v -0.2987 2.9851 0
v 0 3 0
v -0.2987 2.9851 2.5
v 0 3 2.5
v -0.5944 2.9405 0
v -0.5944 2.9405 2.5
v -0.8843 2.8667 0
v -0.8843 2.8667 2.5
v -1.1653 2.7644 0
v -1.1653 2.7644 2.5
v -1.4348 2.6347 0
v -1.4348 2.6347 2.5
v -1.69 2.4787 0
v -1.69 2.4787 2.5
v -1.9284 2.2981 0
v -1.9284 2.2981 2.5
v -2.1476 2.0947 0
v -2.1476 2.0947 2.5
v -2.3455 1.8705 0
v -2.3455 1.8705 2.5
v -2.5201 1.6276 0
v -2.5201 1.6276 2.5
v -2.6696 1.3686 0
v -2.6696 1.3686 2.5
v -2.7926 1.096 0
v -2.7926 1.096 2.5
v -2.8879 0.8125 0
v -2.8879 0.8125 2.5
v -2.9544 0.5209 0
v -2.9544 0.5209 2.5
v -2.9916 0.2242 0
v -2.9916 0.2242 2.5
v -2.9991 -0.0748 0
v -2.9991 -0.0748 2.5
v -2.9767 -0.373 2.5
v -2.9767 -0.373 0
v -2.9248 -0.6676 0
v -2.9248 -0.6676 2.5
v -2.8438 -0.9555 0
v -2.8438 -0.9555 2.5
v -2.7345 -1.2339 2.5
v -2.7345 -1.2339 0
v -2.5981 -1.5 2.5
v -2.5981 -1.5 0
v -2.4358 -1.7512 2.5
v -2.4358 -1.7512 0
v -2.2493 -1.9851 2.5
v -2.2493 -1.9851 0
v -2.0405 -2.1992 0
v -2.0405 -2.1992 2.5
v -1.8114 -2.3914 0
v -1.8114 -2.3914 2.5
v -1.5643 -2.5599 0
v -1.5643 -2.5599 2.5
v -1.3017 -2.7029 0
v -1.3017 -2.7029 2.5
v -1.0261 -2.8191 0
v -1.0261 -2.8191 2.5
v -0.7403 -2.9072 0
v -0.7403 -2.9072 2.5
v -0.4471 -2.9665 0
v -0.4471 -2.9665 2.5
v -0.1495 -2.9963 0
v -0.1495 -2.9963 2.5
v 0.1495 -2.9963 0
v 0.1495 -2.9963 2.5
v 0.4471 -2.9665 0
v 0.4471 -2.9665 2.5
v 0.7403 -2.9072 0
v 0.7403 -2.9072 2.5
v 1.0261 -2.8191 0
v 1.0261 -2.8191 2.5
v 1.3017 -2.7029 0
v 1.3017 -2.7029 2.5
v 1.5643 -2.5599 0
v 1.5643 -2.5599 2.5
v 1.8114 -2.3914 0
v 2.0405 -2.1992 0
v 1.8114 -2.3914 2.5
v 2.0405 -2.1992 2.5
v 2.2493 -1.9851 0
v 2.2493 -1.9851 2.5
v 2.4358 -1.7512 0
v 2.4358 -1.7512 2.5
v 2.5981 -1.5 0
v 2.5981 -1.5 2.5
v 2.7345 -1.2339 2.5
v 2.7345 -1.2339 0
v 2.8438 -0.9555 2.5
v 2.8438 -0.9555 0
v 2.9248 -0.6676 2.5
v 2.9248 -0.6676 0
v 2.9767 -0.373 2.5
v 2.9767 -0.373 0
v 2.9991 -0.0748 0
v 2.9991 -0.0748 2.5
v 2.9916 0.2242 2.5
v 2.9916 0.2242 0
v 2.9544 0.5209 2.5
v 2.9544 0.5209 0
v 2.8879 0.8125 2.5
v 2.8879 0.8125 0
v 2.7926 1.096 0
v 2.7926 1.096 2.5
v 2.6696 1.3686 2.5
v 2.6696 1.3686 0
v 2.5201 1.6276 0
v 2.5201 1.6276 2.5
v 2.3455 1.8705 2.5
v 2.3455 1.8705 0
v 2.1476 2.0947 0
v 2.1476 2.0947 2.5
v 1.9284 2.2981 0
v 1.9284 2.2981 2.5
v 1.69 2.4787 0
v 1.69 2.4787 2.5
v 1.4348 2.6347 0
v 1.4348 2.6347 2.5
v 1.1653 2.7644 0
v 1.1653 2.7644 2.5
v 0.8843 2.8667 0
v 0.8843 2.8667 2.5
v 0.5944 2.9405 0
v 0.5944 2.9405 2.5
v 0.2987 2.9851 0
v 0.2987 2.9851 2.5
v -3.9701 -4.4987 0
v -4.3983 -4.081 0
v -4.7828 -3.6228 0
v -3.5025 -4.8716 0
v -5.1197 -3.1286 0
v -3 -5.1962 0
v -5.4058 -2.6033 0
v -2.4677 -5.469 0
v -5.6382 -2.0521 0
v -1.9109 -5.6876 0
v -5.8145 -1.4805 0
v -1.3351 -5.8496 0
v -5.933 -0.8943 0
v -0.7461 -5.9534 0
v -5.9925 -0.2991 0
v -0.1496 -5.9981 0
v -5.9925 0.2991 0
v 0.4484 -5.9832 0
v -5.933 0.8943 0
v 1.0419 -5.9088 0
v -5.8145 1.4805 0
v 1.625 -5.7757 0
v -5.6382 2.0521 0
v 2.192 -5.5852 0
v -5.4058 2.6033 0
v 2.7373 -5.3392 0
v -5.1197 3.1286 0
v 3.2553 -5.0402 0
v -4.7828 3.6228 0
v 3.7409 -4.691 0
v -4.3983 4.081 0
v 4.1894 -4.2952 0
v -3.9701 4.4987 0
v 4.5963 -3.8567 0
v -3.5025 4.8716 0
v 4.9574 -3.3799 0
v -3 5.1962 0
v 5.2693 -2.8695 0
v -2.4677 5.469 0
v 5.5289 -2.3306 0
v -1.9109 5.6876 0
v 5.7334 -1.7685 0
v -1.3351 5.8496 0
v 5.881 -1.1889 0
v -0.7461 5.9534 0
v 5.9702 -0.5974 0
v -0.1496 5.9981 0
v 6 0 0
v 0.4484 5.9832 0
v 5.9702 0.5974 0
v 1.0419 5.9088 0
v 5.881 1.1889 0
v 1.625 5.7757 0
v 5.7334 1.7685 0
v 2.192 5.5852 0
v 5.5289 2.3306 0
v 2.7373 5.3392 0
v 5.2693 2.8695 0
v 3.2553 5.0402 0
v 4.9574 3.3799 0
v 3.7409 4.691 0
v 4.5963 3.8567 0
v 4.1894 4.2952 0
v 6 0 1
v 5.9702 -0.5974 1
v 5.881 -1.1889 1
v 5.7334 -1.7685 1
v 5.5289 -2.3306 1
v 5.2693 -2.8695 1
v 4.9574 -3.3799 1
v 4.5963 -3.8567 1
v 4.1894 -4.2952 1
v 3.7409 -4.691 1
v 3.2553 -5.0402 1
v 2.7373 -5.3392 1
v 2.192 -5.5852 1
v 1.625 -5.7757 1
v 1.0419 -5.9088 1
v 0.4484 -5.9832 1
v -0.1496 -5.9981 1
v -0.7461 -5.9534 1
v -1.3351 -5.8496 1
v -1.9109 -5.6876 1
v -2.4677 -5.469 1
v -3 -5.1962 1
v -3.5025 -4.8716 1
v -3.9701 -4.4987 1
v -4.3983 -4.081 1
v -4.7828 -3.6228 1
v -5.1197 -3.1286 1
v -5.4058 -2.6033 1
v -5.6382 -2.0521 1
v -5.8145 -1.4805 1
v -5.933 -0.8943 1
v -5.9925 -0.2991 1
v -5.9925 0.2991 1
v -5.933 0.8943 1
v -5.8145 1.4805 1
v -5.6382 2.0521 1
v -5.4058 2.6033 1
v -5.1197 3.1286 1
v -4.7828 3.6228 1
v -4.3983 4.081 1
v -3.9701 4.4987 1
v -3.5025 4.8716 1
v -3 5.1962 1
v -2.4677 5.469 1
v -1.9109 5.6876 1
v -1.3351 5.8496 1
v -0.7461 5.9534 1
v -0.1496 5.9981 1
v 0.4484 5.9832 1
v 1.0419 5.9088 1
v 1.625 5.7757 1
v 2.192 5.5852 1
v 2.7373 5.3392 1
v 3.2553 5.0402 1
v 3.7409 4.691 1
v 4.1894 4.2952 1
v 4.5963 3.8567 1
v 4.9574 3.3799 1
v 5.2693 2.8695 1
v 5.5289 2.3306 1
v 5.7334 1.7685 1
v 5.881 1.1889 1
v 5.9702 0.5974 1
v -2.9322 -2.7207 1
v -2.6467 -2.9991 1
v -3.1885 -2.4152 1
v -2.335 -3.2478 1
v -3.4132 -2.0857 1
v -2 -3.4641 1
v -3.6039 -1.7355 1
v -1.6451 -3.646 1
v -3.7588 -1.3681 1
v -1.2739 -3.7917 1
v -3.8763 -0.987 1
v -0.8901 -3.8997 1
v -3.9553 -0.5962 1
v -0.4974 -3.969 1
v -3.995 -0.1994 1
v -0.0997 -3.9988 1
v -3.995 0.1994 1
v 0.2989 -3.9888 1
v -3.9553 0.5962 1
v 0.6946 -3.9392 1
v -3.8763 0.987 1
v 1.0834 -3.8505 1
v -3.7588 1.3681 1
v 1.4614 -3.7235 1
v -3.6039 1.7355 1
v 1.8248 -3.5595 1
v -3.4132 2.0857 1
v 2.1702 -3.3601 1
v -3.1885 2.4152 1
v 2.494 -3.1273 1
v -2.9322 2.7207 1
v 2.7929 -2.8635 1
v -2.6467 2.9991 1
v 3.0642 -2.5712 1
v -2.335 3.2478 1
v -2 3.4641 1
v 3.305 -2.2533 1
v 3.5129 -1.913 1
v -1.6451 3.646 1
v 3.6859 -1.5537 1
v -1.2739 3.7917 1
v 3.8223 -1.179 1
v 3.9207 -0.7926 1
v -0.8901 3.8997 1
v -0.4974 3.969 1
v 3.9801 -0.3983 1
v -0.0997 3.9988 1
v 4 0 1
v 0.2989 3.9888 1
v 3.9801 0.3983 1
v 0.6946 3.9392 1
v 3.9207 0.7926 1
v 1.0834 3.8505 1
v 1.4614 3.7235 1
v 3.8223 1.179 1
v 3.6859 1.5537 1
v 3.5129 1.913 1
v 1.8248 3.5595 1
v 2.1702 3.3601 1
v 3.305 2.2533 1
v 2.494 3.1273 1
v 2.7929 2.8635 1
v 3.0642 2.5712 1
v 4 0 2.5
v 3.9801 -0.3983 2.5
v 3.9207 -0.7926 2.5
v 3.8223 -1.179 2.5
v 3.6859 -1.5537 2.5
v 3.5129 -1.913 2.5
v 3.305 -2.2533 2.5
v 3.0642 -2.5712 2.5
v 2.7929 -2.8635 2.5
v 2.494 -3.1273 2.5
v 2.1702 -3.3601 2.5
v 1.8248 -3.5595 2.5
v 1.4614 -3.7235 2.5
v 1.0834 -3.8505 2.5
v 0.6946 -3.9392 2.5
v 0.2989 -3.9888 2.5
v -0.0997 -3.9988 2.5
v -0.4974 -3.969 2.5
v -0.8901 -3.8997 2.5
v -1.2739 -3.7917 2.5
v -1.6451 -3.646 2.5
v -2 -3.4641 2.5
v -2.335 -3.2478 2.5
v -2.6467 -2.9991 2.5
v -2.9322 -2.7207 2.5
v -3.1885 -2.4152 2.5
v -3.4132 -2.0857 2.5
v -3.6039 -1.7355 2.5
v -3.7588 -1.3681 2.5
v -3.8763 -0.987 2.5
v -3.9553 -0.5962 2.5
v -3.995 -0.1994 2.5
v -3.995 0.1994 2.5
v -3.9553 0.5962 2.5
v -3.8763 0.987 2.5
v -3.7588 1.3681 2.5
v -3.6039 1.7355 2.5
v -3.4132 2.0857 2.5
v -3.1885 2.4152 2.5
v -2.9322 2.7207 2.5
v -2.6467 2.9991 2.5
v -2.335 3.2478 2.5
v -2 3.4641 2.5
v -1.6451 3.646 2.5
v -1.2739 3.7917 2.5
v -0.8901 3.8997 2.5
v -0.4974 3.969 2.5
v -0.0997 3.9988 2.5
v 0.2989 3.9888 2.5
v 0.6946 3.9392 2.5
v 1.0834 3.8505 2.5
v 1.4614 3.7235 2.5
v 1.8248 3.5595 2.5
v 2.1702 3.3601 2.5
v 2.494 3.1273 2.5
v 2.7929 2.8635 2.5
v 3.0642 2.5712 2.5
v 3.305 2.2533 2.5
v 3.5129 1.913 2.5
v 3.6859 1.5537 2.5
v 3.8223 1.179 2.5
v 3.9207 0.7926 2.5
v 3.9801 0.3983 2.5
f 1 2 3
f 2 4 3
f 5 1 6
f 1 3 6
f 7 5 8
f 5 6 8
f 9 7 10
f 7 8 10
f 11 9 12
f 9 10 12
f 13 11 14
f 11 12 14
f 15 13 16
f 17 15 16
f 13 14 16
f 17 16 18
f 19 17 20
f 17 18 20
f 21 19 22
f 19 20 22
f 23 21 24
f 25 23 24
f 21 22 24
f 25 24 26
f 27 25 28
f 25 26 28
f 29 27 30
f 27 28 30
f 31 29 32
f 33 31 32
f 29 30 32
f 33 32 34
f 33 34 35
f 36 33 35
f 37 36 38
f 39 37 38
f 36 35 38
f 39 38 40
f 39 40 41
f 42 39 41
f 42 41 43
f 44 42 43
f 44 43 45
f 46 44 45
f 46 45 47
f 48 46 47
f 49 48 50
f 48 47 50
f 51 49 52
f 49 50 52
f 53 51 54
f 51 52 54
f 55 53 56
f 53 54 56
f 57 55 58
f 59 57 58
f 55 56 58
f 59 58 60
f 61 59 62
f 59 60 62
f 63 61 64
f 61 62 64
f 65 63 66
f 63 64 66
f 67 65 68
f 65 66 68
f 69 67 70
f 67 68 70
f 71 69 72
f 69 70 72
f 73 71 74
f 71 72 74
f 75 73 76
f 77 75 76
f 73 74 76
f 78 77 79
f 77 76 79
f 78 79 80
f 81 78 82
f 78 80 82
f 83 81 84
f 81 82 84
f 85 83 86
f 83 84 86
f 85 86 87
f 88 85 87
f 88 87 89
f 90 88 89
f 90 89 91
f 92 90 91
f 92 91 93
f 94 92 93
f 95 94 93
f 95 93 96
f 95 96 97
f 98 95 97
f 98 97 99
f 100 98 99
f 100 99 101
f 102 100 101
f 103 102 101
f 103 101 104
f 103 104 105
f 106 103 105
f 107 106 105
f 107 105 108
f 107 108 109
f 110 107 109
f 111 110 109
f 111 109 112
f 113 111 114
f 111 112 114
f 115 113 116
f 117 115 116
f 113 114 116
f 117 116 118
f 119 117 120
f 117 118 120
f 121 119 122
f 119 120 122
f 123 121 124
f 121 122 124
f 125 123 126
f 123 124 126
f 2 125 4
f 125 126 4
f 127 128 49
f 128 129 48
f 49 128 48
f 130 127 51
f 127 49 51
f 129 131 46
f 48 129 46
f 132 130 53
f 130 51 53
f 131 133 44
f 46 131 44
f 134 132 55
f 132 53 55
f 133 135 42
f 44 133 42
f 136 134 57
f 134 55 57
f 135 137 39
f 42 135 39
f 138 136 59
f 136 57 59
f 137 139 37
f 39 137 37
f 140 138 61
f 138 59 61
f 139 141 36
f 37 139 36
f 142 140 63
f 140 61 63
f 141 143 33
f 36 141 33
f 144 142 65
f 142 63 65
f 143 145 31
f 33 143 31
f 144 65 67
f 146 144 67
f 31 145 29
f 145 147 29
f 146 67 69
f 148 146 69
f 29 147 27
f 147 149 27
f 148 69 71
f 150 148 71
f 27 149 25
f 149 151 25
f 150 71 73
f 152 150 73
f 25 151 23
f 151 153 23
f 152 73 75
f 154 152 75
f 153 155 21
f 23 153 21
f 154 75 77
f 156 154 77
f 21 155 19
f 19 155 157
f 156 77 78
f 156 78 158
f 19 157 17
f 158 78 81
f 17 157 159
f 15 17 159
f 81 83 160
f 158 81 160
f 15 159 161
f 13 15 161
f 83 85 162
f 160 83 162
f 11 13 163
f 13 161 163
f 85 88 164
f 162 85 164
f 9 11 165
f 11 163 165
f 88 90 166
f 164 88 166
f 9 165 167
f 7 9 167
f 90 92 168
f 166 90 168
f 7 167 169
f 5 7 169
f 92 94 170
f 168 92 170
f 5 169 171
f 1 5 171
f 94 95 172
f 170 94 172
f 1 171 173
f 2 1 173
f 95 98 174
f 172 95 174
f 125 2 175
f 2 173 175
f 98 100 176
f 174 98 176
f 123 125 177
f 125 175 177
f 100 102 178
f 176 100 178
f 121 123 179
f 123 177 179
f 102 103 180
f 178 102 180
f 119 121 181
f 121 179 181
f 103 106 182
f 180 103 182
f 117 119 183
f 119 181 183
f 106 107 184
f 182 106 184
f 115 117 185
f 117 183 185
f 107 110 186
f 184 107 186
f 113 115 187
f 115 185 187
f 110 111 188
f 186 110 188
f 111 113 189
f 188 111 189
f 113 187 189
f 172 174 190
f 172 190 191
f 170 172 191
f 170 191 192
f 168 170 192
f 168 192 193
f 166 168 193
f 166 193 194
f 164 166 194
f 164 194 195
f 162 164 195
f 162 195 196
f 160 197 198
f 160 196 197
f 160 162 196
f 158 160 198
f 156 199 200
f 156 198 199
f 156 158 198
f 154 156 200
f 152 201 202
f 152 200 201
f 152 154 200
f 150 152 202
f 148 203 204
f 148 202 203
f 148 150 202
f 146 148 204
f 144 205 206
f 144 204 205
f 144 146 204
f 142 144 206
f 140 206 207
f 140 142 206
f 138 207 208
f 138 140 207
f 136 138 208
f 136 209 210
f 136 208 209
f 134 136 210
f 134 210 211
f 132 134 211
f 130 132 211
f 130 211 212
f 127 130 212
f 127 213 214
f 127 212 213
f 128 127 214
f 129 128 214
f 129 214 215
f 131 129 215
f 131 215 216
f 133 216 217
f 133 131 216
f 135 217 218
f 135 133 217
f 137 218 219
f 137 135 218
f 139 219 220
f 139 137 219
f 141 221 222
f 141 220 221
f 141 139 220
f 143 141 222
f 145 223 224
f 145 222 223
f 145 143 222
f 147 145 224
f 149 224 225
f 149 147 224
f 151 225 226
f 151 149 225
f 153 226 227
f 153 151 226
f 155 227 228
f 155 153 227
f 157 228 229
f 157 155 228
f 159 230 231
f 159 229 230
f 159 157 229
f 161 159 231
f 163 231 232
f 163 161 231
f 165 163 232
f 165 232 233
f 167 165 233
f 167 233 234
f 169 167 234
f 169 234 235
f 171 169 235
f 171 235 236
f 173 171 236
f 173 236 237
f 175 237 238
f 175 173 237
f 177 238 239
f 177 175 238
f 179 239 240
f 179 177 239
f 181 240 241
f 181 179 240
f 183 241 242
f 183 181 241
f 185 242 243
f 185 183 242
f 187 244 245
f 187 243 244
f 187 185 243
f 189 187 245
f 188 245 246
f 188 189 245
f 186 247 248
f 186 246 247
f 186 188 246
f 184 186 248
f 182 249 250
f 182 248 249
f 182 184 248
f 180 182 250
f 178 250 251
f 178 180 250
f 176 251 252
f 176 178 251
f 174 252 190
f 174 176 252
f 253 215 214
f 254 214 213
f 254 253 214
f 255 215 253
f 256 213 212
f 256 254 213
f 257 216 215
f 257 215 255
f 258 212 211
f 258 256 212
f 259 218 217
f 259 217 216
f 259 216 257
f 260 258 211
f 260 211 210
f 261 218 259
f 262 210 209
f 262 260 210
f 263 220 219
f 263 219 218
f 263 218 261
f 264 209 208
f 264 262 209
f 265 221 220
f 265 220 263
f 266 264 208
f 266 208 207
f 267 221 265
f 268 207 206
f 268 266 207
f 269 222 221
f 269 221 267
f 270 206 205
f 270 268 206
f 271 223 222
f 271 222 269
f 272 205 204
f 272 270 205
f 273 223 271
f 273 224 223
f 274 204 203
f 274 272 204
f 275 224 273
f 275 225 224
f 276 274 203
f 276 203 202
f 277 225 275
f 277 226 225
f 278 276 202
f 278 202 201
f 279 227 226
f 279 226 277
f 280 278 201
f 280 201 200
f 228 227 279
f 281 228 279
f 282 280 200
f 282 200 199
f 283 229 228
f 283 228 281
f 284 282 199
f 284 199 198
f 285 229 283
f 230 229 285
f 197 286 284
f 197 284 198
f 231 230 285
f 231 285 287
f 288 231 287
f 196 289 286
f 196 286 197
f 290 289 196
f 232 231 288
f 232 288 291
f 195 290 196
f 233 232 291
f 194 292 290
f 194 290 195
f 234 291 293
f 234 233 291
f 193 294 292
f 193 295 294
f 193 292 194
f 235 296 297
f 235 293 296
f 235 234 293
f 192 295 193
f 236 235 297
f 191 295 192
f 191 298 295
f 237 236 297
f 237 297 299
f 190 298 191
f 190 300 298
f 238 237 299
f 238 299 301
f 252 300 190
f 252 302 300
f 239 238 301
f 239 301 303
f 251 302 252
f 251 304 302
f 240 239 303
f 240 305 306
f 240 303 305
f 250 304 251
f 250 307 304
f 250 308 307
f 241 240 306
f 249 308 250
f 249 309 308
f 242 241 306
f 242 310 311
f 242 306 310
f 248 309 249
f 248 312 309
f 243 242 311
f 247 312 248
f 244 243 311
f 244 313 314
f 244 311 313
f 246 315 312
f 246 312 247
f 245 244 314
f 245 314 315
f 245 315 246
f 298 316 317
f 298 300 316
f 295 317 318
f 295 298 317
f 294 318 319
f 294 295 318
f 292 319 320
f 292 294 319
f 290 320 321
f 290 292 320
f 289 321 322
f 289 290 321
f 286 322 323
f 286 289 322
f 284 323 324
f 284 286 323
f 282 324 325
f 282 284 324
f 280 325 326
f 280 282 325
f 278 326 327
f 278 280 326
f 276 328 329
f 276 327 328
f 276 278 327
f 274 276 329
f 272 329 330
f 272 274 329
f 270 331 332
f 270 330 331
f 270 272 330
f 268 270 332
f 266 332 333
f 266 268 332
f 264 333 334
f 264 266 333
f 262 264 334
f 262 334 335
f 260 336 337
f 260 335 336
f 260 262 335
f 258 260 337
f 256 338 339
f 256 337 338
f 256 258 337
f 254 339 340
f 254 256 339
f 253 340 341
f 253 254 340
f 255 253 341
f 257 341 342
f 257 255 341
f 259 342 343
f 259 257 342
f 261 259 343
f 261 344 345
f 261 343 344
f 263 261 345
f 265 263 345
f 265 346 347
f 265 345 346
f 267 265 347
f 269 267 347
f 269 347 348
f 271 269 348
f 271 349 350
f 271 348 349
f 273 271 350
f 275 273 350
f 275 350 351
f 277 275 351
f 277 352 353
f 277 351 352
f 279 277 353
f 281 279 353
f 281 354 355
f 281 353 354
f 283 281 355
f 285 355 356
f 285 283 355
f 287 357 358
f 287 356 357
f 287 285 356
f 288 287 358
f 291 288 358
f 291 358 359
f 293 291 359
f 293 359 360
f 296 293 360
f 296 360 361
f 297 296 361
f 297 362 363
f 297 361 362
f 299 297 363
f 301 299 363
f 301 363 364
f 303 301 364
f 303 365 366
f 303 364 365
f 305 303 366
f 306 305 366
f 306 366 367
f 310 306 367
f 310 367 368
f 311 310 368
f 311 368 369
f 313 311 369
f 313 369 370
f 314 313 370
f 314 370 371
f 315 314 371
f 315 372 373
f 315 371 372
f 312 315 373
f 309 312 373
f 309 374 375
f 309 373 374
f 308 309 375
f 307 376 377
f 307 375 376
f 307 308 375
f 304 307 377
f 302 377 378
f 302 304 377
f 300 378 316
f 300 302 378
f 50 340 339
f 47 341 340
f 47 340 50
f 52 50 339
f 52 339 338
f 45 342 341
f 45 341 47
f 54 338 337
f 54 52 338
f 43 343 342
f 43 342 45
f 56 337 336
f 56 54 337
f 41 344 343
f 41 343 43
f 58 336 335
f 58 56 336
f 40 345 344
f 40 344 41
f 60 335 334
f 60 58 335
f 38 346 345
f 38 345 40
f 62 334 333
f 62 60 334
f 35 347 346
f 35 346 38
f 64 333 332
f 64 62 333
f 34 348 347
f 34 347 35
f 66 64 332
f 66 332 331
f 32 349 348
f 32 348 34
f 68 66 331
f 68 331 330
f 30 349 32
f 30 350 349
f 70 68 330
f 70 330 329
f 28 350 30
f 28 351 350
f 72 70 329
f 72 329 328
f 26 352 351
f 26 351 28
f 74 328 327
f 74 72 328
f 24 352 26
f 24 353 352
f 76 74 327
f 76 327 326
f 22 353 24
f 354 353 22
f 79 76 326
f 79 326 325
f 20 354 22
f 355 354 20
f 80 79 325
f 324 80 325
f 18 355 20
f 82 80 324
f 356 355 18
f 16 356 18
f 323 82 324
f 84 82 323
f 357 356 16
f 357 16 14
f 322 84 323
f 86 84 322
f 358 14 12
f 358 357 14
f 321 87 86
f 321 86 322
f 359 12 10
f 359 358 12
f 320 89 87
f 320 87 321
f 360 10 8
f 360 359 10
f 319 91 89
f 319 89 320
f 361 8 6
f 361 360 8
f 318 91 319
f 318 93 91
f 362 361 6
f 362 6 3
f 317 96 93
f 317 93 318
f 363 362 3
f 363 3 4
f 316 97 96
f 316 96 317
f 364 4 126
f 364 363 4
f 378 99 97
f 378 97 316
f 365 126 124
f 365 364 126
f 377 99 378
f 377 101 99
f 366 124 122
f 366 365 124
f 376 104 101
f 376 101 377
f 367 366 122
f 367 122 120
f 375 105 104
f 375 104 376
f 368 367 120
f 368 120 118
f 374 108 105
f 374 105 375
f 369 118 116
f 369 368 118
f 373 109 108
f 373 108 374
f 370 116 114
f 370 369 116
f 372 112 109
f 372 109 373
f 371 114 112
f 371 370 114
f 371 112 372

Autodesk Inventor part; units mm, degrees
ref_plane "YZ Plane" through (0, 0, 0) normal (1, 0, 0) x (0, 1, 0)
ref_plane "XZ Plane" through (0, 0, 0) normal (0, 1, 0) x (-1, 0, 0)
ref_plane "XY Plane" through (0, 0, 0) normal (0, 0, 1) x (1, 0, 0)
sketch "スケッチ1" plane through (0, 0, 0) normal (0, 0, 1) x (1, 0, 0)
  circle A0 centre (0, 0) radius 6
  dimension "d0" = 12
extrude "押し出し1" add sketch "スケッチ1" along normal blind 1
sketch "スケッチ2" plane through (0, 0, 1) normal (0, 0, 1) x (1, 0, 0)
  circle A0 centre (0, 0) radius 4
  circle A1 centre (0, 0) radius 3
  dimension "d3" = 8
  dimension "d4" = 6
extrude "押し出し2" add sketch "スケッチ2" along normal blind 1.5
hole "穴1" at (0, 0, 0) direction (0, 0, 1) diameter 6 end through all
properties part number "GFM-0608-025"
